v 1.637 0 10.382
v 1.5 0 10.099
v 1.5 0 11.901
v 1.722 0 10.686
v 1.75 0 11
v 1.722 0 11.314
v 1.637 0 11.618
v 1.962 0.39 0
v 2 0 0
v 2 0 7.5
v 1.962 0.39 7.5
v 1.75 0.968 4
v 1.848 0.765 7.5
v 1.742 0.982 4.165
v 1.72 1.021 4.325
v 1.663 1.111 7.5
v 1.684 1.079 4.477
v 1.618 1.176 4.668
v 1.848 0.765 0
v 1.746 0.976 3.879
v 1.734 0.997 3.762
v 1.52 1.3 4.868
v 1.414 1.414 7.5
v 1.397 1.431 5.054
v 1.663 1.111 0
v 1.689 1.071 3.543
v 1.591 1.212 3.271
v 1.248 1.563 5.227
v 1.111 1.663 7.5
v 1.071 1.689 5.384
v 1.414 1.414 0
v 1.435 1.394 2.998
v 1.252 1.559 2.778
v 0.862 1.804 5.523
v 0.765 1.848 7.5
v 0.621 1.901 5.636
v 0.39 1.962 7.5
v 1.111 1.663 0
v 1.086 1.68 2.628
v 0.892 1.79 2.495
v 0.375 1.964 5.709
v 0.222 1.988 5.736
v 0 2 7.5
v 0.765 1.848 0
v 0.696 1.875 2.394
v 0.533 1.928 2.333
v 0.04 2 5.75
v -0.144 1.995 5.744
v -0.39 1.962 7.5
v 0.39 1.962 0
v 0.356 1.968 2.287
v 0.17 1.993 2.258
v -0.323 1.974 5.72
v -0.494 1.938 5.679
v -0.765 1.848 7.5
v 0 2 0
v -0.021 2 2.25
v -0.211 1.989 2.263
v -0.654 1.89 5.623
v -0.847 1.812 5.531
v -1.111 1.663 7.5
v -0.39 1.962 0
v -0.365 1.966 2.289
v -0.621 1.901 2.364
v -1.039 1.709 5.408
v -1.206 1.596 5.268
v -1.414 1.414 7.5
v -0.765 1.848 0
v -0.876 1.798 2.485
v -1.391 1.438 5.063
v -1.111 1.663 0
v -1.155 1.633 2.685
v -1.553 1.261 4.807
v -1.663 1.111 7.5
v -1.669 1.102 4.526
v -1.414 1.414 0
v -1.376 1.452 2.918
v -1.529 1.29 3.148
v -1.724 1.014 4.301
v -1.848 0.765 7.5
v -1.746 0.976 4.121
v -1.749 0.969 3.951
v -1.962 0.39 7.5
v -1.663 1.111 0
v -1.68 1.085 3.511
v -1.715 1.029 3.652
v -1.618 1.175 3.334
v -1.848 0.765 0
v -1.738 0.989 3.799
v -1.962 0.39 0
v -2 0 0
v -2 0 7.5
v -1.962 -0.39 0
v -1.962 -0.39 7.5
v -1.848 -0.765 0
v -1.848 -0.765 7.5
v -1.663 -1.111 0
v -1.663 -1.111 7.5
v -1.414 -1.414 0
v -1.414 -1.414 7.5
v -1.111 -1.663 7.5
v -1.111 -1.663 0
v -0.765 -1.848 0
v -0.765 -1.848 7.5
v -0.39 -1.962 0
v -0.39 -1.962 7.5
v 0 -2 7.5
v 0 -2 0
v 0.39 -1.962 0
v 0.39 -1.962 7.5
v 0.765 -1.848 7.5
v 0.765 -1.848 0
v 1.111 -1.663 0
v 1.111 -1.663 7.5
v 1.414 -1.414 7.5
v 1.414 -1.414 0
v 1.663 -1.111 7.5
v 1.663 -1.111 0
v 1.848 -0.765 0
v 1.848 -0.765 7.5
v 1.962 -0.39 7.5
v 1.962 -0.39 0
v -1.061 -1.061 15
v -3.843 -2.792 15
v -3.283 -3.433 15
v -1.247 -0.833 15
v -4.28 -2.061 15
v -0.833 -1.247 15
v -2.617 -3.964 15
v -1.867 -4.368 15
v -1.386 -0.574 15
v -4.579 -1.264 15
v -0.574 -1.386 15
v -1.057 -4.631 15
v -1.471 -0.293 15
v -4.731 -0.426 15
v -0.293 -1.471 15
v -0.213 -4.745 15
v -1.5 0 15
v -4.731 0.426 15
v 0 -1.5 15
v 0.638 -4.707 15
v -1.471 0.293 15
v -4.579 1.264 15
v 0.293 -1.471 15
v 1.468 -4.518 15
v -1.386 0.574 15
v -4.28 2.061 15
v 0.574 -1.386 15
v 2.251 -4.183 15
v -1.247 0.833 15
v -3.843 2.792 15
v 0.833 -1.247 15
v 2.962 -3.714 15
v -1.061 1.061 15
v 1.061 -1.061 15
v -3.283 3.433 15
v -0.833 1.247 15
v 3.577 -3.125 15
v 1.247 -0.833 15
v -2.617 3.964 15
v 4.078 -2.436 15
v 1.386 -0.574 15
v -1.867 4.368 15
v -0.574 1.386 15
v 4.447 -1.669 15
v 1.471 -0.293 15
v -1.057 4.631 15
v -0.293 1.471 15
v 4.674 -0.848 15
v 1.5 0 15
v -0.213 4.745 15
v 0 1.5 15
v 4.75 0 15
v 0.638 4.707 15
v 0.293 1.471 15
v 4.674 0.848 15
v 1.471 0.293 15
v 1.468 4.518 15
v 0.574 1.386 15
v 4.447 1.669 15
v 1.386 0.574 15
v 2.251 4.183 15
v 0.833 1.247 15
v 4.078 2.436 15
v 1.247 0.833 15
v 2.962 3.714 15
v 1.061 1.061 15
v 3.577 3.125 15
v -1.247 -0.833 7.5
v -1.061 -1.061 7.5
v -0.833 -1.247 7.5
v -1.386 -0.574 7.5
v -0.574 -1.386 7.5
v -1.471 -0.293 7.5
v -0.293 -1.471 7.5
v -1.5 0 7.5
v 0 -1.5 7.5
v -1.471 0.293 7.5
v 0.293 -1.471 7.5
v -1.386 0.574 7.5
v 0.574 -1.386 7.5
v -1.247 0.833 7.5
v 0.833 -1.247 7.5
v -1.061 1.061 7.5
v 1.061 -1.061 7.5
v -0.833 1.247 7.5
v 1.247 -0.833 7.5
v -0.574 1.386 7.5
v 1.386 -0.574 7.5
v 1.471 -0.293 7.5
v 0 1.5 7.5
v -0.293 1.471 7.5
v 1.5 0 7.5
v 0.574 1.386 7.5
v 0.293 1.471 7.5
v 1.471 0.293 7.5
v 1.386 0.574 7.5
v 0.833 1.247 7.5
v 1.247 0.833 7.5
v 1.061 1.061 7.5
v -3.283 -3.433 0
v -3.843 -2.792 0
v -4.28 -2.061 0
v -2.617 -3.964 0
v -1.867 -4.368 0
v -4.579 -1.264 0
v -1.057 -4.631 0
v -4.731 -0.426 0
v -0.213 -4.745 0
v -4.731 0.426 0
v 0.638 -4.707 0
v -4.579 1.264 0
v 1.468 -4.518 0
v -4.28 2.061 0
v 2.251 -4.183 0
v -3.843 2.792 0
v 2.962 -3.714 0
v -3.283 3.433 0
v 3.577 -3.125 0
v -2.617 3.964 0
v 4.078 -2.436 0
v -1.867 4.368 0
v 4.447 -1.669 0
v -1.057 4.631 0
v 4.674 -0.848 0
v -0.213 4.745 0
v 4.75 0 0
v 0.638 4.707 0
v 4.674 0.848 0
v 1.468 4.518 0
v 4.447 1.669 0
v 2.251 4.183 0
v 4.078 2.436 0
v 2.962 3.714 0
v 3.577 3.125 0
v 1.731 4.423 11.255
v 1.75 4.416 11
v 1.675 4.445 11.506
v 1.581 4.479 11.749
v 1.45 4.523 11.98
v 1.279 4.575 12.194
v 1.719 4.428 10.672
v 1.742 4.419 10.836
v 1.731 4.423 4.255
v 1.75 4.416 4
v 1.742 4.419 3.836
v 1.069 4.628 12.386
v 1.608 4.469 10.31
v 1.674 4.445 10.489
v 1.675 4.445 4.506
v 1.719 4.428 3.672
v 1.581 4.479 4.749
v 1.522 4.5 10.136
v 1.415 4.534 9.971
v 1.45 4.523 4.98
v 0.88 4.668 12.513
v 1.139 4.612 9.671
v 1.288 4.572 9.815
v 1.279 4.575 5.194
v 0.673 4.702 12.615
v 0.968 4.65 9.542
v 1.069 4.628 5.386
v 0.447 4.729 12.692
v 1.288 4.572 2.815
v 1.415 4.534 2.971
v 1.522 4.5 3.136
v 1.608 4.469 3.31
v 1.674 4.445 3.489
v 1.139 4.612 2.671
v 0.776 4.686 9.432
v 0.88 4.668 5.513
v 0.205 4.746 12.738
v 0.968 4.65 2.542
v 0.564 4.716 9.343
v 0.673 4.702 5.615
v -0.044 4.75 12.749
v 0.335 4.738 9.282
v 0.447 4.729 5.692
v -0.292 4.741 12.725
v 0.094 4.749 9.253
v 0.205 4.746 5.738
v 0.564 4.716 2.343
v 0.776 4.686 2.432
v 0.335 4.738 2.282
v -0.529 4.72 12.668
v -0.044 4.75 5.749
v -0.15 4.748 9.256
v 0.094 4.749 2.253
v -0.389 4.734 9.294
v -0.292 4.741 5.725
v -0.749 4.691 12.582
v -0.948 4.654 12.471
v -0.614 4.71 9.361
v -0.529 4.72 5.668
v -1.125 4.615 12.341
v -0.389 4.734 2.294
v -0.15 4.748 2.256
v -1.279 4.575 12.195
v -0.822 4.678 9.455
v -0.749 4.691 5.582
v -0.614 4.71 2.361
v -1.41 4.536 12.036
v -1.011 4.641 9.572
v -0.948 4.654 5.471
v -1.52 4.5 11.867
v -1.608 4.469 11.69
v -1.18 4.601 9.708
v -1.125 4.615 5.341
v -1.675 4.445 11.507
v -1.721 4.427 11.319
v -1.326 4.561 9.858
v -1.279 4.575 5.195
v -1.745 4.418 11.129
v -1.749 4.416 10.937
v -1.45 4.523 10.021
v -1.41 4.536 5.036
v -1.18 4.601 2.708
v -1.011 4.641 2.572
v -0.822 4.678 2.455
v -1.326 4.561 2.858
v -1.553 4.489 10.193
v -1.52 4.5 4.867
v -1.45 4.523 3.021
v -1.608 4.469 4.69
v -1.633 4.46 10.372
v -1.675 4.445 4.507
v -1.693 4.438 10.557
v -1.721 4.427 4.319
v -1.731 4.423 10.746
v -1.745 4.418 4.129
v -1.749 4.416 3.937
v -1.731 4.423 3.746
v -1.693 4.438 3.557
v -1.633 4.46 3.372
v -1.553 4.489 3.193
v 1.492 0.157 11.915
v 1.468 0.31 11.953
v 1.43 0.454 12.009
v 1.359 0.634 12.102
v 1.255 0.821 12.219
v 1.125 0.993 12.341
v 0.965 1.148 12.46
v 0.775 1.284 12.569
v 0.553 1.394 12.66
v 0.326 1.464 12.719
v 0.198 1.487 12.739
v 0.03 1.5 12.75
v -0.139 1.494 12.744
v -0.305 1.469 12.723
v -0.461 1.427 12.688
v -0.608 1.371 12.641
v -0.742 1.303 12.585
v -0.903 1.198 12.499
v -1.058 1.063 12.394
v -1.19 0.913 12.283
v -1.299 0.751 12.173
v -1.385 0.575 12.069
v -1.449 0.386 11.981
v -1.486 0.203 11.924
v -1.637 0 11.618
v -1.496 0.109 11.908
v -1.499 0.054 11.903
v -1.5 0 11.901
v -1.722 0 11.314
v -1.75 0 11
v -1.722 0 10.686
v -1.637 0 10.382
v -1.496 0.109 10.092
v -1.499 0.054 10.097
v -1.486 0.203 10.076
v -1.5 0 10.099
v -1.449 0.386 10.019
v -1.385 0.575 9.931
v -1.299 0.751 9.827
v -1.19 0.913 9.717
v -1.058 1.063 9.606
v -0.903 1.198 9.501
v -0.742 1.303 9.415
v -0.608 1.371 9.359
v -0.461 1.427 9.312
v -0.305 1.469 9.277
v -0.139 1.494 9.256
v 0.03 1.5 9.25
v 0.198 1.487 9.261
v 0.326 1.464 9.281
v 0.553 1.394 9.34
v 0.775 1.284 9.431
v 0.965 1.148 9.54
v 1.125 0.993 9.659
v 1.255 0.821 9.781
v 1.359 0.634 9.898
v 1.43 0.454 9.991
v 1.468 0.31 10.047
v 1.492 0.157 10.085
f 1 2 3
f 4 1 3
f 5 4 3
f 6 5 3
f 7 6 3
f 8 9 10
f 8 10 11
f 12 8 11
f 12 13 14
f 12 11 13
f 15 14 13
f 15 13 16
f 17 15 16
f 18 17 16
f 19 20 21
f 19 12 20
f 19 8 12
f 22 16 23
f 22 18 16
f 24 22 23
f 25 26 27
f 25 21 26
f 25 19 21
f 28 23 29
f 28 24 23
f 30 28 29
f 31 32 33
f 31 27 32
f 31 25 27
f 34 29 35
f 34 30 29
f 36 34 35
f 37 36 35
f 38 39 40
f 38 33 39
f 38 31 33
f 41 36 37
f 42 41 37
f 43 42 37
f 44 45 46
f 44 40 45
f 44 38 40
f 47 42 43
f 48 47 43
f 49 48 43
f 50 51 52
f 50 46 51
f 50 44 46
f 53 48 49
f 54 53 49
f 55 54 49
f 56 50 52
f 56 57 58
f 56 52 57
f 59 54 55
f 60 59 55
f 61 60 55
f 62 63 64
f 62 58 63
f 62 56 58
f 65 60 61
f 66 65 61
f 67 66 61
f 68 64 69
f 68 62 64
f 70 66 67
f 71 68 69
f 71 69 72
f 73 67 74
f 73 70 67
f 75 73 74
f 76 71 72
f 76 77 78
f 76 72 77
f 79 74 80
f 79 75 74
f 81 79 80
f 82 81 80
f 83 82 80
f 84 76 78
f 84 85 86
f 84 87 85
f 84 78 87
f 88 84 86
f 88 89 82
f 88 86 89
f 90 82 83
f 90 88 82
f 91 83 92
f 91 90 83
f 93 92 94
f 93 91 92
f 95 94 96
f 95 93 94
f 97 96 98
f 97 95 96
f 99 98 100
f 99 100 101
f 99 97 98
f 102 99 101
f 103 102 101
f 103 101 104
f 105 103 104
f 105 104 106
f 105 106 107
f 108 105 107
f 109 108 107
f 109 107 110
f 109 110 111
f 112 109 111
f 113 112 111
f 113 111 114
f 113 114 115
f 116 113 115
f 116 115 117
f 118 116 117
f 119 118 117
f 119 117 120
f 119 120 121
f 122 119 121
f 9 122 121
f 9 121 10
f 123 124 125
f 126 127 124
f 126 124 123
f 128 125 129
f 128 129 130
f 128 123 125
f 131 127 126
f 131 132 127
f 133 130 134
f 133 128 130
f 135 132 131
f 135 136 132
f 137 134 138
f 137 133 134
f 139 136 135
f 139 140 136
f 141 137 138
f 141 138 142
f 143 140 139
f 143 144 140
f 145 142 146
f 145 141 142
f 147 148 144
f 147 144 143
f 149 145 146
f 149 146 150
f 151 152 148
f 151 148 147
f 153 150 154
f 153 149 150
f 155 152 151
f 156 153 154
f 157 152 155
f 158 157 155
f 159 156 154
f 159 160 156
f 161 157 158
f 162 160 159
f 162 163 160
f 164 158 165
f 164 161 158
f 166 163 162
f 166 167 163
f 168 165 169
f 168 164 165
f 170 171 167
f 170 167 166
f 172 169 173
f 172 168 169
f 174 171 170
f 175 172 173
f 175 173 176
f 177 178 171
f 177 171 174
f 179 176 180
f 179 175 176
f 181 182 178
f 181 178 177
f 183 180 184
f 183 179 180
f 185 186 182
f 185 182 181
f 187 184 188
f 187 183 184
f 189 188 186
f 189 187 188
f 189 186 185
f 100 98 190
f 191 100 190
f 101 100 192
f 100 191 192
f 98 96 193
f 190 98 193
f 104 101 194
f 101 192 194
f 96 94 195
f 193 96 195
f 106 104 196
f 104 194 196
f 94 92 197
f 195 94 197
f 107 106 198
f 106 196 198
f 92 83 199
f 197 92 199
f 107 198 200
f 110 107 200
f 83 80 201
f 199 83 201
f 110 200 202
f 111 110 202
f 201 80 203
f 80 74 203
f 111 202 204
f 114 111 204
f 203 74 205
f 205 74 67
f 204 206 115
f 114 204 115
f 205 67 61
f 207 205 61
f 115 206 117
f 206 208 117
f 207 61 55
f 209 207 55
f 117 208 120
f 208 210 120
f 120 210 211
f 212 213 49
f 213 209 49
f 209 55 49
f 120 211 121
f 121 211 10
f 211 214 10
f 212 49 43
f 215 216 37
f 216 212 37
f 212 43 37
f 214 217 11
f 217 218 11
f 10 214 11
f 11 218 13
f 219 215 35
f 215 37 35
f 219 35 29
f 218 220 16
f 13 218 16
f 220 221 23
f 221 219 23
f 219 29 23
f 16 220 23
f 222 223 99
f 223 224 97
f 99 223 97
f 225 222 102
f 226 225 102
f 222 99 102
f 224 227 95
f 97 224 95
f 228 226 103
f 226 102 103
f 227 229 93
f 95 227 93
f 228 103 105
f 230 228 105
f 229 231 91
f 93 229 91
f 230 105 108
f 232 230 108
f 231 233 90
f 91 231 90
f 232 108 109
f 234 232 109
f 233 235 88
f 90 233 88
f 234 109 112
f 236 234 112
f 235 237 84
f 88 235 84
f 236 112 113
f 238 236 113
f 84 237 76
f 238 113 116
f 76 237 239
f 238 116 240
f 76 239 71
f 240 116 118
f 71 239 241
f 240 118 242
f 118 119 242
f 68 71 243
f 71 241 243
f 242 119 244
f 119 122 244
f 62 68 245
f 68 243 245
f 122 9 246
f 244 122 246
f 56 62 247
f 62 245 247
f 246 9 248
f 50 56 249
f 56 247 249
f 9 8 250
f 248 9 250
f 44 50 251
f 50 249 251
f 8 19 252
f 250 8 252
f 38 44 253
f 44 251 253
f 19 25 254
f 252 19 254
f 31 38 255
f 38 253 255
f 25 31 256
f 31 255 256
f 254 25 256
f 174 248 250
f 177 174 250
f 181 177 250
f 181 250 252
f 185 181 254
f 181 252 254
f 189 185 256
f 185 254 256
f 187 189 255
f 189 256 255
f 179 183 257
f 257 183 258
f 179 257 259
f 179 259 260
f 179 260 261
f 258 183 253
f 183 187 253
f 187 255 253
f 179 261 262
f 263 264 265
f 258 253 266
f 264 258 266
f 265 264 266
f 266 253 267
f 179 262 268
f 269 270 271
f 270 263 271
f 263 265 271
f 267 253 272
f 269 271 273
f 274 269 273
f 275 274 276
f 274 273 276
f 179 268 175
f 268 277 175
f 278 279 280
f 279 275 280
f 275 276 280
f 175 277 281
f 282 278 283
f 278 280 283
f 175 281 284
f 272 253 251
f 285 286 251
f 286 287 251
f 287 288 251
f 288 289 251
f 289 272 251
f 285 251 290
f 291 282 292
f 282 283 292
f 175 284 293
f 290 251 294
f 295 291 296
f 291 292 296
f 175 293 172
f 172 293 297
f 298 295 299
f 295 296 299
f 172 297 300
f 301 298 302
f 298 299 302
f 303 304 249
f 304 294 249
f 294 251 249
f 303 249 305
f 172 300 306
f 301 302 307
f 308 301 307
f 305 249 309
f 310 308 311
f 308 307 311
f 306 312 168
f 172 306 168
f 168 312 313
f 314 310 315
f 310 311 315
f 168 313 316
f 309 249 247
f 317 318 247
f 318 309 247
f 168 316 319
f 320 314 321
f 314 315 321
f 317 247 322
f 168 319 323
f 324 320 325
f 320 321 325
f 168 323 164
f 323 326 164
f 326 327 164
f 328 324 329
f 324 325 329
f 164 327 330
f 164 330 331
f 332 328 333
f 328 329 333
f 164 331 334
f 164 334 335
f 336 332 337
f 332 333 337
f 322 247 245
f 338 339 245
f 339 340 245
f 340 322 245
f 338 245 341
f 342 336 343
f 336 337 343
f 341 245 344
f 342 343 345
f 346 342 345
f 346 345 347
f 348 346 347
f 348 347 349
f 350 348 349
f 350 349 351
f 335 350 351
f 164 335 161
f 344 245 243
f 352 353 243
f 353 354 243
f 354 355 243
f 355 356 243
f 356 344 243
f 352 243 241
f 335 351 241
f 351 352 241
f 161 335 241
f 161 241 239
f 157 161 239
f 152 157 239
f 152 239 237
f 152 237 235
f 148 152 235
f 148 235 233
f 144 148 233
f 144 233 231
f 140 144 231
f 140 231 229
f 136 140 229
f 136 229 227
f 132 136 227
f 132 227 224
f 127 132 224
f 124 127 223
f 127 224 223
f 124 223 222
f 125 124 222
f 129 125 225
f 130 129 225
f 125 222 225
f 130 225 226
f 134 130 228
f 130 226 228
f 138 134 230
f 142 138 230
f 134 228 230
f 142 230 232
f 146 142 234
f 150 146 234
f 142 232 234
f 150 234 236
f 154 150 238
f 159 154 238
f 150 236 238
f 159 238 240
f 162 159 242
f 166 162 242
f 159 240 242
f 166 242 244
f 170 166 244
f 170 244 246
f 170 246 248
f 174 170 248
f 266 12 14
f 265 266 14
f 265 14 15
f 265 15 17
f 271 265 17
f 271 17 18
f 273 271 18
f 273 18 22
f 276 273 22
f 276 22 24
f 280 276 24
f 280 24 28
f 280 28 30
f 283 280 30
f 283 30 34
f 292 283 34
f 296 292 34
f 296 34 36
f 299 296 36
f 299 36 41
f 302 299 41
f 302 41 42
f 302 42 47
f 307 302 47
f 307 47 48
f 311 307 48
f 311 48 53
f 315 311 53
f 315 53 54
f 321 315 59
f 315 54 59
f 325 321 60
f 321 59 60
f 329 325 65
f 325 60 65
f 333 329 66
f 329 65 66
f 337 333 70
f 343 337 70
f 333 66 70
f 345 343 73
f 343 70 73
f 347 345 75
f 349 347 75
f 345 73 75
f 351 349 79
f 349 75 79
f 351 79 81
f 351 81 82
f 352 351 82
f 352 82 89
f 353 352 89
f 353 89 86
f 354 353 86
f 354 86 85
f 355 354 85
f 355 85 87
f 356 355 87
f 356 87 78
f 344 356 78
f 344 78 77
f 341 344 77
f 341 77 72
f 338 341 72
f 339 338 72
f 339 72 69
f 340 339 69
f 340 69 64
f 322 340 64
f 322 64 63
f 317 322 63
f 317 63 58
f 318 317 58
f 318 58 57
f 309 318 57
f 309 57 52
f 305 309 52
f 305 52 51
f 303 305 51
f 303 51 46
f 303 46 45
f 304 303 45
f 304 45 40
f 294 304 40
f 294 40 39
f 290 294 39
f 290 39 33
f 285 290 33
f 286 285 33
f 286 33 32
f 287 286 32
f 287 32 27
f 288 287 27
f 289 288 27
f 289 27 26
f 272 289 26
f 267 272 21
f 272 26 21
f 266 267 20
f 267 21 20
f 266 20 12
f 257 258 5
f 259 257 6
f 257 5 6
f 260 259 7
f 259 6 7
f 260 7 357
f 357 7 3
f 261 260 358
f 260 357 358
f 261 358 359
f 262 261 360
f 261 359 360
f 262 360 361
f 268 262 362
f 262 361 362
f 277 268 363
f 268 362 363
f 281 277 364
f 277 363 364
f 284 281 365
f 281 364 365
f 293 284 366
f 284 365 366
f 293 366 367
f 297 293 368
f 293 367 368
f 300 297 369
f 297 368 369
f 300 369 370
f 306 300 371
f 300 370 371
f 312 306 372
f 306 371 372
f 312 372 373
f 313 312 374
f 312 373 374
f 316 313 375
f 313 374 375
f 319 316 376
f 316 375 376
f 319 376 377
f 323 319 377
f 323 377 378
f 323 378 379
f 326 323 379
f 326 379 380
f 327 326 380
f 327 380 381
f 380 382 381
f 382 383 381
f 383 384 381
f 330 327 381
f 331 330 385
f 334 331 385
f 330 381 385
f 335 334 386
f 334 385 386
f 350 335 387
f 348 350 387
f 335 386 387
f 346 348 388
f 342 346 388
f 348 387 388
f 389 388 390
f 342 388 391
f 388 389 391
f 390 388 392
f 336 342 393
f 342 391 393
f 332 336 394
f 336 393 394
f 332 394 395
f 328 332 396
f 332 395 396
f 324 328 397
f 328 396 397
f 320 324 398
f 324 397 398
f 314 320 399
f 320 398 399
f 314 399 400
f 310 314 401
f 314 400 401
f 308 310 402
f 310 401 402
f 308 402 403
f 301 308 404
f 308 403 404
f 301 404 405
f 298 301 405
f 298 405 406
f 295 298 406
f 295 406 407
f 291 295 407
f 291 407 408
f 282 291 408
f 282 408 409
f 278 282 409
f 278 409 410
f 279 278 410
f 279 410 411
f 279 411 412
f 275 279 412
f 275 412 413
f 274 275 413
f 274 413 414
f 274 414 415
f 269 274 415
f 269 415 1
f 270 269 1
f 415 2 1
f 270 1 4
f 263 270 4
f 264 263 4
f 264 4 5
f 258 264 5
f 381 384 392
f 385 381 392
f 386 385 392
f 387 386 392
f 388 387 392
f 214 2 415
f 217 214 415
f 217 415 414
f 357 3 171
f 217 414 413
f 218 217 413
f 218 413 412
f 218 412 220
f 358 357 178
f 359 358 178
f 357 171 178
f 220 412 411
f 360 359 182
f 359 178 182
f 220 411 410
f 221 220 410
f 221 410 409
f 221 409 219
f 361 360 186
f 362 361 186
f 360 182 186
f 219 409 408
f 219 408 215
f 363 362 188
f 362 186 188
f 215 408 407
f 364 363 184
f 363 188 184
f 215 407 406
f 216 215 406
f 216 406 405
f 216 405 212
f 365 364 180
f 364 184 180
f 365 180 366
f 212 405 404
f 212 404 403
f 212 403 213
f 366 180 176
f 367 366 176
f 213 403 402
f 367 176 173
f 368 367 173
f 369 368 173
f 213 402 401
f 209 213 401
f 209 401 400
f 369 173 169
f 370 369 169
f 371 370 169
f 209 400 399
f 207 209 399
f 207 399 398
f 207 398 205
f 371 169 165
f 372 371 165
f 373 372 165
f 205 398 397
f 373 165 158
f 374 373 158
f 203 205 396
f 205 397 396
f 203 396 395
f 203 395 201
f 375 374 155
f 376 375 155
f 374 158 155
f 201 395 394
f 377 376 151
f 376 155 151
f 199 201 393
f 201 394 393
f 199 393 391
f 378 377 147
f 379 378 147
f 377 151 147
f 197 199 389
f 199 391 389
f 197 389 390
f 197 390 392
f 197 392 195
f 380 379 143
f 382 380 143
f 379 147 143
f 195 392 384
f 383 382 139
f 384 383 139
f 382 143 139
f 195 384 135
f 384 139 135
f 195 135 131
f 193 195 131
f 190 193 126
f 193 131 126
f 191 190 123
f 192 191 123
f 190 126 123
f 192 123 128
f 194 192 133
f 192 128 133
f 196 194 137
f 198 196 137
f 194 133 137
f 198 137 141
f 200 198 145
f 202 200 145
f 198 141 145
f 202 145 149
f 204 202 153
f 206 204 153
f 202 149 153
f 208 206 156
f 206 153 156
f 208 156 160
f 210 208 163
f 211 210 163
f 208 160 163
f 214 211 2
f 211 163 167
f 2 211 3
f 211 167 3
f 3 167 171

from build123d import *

# Parameters (mm, degrees)
F0_R     = 4.75
F1_DEPTH = 15
F2_R     = 1.5
F3_DEPTH = 7.5
F4_R     = 2
F5_DEPTH = 7.5
F8_D     = 3.5
F8_DEPTH = 5
F8_TIP   = 1.0515060833
F9_D     = 3.5
F9_DEPTH = 5
F9_TIP   = 1.0515060833


with BuildPart() as f1:
    # F0 (on Top) → F1 (new body)
    with BuildSketch(Plane.XY):
        Circle(F0_R)
    extrude(amount=F1_DEPTH)

    # F2 (on face) → F3 (cut)
    with BuildSketch(Plane.XY.offset(15)):
        Circle(F2_R)
    extrude(amount=-F3_DEPTH, mode=Mode.SUBTRACT)

    # F4 (on Top) → F5 (cut)
    with BuildSketch(Plane.XY):
        Circle(F4_R)
    extrude(amount=F5_DEPTH, mode=Mode.SUBTRACT)

    # F8 (one way)
    with BuildSketch(Plane.XZ):
        with Locations((0, 11)):
            Circle(F8_D / 2)
    extrude(amount=-F8_DEPTH, mode=Mode.SUBTRACT)
    with Locations(Plane.XZ):
        with Locations((0, 11)):
            with Locations((0, 0, -(F8_DEPTH + F8_TIP / 2))):  # 118° drill point
                Cone(0, F8_D / 2, F8_TIP, mode=Mode.SUBTRACT)

    # F9 (one way)
    with BuildSketch(Plane.XZ):
        with Locations((0, 4)):
            Circle(F9_D / 2)
    extrude(amount=-F9_DEPTH, mode=Mode.SUBTRACT)
    with Locations(Plane.XZ):
        with Locations((0, 4)):
            with Locations((0, 0, -(F9_DEPTH + F9_TIP / 2))):  # 118° drill point
                Cone(0, F9_D / 2, F9_TIP, mode=Mode.SUBTRACT)


solid = f1.part
